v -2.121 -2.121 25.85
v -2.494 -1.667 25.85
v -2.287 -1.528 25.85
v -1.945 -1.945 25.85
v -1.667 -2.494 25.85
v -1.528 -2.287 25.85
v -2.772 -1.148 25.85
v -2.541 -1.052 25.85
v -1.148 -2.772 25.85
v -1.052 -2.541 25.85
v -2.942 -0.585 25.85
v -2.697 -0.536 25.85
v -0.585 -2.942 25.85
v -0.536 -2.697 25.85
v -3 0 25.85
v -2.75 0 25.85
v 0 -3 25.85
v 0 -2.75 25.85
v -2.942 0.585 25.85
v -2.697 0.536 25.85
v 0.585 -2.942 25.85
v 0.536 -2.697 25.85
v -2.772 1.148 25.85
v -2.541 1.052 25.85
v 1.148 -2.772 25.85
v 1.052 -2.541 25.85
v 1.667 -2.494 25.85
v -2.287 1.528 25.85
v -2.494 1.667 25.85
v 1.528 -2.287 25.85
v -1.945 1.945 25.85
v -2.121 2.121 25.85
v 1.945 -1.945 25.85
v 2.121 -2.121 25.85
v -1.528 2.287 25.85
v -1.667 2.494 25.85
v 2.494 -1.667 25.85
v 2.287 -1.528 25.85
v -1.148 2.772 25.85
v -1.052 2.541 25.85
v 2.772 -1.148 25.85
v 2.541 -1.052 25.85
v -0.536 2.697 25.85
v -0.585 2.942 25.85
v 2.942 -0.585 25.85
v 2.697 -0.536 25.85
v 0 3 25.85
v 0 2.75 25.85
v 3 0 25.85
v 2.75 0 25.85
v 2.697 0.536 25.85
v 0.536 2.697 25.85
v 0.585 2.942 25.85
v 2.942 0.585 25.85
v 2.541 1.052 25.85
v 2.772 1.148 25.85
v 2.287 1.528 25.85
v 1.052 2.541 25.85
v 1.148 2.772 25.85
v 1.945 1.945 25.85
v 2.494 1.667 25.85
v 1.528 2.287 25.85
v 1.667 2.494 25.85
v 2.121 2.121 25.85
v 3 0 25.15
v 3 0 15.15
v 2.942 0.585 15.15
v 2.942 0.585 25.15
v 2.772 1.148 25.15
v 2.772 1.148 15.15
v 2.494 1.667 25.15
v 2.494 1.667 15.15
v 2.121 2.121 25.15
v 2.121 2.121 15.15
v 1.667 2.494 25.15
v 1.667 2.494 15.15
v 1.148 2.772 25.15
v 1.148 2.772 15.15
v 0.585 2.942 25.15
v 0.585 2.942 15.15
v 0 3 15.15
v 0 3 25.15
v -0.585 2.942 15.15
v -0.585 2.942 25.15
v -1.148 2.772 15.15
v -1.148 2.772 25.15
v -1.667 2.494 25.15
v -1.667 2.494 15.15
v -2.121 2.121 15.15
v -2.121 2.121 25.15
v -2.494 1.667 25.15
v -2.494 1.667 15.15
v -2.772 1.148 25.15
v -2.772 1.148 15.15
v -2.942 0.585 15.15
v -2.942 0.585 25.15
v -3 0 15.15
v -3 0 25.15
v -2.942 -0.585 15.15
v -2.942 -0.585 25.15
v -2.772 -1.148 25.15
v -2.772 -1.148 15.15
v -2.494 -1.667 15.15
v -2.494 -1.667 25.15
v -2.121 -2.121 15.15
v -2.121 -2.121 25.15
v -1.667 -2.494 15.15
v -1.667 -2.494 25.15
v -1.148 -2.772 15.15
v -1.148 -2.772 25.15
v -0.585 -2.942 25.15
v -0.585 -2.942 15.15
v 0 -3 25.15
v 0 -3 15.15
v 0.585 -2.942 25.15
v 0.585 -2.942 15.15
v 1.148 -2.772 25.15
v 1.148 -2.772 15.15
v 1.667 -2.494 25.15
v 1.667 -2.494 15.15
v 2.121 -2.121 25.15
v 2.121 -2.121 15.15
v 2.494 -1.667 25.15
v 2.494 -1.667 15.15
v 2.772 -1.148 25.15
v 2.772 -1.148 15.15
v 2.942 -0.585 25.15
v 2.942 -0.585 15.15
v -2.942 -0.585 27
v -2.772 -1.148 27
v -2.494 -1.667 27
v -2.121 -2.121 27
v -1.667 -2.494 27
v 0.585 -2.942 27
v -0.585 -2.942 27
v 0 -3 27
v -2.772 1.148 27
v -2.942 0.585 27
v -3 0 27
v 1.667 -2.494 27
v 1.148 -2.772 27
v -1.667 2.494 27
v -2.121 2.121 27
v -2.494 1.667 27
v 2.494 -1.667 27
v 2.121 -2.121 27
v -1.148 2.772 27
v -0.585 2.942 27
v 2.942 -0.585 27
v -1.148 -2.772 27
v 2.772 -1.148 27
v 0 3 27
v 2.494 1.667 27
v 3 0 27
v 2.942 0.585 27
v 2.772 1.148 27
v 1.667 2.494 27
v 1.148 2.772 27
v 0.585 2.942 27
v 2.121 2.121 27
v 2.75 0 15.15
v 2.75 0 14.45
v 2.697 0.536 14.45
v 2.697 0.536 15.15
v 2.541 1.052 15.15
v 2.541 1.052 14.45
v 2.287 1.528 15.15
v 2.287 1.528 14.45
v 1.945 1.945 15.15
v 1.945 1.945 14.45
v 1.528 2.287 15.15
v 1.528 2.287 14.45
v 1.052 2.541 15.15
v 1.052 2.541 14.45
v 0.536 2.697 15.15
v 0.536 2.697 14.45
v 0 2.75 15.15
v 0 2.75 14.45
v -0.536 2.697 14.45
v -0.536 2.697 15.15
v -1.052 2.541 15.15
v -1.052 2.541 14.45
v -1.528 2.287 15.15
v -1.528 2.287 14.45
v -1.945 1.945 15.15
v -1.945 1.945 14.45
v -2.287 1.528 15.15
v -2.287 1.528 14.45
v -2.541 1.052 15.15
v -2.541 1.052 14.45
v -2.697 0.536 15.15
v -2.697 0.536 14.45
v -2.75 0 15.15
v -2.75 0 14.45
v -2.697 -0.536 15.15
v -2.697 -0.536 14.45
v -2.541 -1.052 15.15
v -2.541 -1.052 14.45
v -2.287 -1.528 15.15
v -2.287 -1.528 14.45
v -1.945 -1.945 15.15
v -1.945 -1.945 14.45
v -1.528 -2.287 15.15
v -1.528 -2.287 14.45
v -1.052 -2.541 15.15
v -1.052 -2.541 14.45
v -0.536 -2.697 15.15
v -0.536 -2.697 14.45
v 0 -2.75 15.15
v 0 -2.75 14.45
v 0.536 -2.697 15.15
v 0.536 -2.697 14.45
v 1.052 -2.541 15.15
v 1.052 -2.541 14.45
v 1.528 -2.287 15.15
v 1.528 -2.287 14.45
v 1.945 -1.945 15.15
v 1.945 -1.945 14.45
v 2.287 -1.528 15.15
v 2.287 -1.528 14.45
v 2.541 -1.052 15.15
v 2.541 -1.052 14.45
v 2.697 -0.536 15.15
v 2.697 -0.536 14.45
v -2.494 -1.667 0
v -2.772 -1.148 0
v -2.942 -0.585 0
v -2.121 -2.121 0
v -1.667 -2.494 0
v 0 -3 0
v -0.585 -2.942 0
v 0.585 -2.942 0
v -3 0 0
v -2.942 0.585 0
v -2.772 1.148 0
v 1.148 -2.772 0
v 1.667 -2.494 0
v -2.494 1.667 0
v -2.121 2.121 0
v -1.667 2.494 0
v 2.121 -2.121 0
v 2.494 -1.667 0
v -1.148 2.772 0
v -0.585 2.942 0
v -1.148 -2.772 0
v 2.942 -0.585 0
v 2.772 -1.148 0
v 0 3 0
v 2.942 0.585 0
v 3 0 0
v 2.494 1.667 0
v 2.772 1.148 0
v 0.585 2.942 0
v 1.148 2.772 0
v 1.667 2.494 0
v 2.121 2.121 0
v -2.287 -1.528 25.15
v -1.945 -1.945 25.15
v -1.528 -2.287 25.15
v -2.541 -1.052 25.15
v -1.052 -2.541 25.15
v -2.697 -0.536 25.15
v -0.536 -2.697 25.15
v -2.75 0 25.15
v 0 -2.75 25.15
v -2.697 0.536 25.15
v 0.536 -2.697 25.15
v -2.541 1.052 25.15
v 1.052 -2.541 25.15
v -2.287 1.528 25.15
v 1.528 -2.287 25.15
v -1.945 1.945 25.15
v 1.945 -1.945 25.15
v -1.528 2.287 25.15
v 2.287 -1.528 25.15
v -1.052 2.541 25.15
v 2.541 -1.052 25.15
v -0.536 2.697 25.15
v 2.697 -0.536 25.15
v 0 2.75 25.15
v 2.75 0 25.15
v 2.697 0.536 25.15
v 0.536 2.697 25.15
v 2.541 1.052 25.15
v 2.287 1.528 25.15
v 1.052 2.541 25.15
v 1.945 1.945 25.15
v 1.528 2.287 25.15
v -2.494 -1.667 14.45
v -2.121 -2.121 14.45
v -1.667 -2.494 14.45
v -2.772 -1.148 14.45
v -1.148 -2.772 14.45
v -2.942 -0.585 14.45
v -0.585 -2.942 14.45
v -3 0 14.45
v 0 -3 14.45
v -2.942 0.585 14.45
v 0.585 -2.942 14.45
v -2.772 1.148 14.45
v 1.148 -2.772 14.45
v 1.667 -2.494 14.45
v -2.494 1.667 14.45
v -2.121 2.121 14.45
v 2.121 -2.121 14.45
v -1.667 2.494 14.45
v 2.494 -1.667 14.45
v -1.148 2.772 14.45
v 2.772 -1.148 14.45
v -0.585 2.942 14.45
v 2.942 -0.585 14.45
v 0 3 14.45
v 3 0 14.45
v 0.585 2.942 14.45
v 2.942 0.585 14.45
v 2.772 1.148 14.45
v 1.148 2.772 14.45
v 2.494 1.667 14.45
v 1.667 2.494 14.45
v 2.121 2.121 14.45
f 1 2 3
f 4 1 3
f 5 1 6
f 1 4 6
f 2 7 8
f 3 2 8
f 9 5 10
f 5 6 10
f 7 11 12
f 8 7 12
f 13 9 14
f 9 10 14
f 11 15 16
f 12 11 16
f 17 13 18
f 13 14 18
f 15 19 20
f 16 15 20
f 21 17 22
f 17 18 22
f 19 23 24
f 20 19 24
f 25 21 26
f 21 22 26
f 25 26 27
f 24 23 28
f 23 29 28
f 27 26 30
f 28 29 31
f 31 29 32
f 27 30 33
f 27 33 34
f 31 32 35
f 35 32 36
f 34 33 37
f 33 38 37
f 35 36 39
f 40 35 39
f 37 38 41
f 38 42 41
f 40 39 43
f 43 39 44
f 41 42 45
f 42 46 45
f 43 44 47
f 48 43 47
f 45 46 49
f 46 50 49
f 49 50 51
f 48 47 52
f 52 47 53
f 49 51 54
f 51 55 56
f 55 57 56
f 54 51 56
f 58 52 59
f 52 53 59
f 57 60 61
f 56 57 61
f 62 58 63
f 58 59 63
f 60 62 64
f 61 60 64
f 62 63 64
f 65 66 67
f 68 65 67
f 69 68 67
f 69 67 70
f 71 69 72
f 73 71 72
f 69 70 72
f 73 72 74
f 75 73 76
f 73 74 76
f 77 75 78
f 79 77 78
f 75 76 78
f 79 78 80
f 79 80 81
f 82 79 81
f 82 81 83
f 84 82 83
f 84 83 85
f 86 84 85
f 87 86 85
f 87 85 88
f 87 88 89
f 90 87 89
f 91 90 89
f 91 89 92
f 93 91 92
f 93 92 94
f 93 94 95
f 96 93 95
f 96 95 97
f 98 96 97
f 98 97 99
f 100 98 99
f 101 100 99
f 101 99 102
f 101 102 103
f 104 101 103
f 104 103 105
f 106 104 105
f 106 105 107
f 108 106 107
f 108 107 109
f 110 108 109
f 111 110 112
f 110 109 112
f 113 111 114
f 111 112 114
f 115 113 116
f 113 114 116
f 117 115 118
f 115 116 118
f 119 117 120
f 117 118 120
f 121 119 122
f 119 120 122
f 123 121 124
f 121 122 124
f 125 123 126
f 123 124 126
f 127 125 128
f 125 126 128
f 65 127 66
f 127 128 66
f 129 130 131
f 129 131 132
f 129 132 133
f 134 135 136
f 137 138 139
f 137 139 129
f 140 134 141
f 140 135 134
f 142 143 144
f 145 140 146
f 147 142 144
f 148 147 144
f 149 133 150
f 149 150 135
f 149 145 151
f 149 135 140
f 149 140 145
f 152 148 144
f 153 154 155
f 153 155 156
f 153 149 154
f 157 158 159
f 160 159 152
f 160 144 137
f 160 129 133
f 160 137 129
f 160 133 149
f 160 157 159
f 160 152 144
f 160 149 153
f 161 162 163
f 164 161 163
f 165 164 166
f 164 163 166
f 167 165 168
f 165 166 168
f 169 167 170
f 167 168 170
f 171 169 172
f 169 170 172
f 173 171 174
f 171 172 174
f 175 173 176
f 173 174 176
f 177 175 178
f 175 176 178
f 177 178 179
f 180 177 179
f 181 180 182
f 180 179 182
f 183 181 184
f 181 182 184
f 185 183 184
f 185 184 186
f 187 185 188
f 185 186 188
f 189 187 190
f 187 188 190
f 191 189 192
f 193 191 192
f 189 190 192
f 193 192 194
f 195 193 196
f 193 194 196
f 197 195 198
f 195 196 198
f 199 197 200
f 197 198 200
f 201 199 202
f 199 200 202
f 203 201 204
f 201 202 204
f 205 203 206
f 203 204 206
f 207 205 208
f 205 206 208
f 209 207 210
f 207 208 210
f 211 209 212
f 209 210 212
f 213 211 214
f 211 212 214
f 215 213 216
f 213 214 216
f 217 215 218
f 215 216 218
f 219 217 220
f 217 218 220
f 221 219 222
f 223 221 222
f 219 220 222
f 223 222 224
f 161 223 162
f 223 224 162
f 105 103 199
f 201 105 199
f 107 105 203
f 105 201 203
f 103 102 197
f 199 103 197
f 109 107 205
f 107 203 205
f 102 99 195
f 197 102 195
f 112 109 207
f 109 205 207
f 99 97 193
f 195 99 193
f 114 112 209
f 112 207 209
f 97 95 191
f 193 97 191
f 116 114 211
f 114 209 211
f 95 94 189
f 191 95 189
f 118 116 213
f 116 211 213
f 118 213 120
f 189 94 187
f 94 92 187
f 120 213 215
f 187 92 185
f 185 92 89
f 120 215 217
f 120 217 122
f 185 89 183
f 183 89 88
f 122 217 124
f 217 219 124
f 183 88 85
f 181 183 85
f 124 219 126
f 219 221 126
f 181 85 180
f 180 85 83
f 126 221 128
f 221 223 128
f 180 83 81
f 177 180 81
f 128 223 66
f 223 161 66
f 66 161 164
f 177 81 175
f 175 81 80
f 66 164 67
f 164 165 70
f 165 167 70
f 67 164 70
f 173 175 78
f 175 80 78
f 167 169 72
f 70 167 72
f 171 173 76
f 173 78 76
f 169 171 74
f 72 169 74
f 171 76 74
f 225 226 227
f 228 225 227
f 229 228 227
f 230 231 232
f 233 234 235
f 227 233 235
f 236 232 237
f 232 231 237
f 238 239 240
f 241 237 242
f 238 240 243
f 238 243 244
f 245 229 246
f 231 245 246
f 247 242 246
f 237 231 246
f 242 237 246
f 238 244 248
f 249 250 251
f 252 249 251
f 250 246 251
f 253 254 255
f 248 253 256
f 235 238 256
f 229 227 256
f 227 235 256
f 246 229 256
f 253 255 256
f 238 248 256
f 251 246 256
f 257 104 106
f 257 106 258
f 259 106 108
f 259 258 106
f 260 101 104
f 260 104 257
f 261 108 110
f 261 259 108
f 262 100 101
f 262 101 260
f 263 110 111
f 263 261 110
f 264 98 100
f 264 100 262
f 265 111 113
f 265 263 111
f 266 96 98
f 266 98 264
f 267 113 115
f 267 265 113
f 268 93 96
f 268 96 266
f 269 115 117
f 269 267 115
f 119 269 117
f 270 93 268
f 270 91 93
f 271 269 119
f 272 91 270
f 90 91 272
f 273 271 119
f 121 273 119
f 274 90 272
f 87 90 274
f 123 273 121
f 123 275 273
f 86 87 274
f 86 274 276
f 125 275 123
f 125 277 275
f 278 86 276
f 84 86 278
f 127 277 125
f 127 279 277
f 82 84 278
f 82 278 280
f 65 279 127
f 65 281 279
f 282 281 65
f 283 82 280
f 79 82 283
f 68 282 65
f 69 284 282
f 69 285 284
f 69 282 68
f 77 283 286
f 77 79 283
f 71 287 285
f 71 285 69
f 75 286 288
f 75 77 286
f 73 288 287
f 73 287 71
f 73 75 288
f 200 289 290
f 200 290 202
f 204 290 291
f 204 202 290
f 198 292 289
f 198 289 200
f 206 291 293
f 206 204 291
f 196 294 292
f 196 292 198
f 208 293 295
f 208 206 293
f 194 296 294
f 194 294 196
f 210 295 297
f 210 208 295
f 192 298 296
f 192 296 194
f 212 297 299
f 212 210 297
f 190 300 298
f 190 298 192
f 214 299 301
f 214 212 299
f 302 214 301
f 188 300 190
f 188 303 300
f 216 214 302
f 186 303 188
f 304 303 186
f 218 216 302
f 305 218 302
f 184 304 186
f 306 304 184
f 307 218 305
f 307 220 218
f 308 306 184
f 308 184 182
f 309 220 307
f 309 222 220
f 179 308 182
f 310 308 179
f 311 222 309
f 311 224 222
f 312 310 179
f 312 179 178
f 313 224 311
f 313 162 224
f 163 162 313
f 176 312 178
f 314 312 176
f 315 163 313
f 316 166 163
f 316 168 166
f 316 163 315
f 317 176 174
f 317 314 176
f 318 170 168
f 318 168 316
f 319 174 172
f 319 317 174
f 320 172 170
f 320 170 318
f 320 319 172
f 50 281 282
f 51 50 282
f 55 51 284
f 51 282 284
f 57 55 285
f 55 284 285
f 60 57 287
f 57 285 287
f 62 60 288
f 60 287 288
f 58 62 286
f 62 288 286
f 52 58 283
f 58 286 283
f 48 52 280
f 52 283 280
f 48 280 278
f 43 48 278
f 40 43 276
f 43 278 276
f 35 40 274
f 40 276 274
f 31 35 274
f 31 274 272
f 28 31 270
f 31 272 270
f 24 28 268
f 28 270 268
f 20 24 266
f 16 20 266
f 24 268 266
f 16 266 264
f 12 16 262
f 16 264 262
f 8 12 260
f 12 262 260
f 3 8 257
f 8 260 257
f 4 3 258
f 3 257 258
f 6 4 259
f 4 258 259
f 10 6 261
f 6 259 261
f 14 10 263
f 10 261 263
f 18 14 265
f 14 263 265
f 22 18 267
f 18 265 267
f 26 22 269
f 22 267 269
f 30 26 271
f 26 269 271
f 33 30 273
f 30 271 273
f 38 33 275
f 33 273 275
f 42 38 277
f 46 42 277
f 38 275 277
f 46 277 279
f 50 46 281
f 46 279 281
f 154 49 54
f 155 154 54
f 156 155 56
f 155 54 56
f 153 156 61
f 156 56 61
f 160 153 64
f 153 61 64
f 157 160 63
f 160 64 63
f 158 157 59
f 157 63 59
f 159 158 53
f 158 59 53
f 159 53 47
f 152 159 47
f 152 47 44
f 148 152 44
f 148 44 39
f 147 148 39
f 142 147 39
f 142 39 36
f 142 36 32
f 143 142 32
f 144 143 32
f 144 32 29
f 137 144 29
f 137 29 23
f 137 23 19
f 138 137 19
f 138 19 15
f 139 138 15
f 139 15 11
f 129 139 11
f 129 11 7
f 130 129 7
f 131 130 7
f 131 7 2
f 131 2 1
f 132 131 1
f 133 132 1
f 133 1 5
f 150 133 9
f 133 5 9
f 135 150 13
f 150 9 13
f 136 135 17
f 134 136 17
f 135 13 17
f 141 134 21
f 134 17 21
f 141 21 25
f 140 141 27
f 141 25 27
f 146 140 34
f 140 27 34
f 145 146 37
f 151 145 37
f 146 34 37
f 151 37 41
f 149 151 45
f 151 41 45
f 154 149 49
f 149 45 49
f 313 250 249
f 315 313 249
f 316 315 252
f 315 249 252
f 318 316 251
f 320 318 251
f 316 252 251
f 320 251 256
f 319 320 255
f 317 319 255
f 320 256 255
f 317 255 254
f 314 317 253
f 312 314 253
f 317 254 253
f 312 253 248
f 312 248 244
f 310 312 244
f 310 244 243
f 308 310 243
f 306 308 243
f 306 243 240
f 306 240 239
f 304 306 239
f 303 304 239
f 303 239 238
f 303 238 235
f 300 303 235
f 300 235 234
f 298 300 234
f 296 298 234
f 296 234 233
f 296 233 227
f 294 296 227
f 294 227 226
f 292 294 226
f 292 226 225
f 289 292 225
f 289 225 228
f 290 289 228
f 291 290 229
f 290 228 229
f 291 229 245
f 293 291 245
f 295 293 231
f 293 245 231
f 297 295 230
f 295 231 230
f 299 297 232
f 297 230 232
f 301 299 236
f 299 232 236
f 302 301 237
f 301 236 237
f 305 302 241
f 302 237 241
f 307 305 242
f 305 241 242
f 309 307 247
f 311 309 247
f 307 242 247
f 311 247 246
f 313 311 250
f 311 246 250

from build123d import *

# Parameters (mm, degrees)
SKETCH_1_R               = 3
EXTRUDE_1_DEPTH          = 27
CUT_EXTRUDE_1_DEPTH      = 0.35
CUT_EXTRUDE_1_DEPTH_BACK = 0.35
SKETCH_2_R               = 3
SKETCH_2_R_2             = 2.75
CUT_EXTRUDE_START        = -0.7
SKETCH_3_R               = 3
SKETCH_3_R_2             = 2.75
CUT_EXTRUDE_2_DEPTH      = 0.7


with BuildPart() as part:
    # 스케치1 → 보스-돌출1 (new body)
    with BuildSketch(Plane.XY):
        Circle(SKETCH_1_R)
    extrude(amount=EXTRUDE_1_DEPTH)

    # 스케치2 → 컷-돌출1 (cut, two sides: drawn at the far end of the back side and taken through both)
    with BuildSketch(Plane.XY.offset(25.5).offset(-CUT_EXTRUDE_1_DEPTH_BACK)):
        Circle(SKETCH_2_R)
        Circle(SKETCH_2_R_2, mode=Mode.SUBTRACT)
    extrude(amount=CUT_EXTRUDE_1_DEPTH + CUT_EXTRUDE_1_DEPTH_BACK, mode=Mode.SUBTRACT)

    # 스케치3 → 컷-돌출2 (cut)
    with BuildSketch(Plane.XY.offset(15.15).offset(CUT_EXTRUDE_START)):
        Circle(SKETCH_3_R)
        Circle(SKETCH_3_R_2, mode=Mode.SUBTRACT)
    extrude(amount=CUT_EXTRUDE_2_DEPTH, mode=Mode.SUBTRACT)


solid = part.part
